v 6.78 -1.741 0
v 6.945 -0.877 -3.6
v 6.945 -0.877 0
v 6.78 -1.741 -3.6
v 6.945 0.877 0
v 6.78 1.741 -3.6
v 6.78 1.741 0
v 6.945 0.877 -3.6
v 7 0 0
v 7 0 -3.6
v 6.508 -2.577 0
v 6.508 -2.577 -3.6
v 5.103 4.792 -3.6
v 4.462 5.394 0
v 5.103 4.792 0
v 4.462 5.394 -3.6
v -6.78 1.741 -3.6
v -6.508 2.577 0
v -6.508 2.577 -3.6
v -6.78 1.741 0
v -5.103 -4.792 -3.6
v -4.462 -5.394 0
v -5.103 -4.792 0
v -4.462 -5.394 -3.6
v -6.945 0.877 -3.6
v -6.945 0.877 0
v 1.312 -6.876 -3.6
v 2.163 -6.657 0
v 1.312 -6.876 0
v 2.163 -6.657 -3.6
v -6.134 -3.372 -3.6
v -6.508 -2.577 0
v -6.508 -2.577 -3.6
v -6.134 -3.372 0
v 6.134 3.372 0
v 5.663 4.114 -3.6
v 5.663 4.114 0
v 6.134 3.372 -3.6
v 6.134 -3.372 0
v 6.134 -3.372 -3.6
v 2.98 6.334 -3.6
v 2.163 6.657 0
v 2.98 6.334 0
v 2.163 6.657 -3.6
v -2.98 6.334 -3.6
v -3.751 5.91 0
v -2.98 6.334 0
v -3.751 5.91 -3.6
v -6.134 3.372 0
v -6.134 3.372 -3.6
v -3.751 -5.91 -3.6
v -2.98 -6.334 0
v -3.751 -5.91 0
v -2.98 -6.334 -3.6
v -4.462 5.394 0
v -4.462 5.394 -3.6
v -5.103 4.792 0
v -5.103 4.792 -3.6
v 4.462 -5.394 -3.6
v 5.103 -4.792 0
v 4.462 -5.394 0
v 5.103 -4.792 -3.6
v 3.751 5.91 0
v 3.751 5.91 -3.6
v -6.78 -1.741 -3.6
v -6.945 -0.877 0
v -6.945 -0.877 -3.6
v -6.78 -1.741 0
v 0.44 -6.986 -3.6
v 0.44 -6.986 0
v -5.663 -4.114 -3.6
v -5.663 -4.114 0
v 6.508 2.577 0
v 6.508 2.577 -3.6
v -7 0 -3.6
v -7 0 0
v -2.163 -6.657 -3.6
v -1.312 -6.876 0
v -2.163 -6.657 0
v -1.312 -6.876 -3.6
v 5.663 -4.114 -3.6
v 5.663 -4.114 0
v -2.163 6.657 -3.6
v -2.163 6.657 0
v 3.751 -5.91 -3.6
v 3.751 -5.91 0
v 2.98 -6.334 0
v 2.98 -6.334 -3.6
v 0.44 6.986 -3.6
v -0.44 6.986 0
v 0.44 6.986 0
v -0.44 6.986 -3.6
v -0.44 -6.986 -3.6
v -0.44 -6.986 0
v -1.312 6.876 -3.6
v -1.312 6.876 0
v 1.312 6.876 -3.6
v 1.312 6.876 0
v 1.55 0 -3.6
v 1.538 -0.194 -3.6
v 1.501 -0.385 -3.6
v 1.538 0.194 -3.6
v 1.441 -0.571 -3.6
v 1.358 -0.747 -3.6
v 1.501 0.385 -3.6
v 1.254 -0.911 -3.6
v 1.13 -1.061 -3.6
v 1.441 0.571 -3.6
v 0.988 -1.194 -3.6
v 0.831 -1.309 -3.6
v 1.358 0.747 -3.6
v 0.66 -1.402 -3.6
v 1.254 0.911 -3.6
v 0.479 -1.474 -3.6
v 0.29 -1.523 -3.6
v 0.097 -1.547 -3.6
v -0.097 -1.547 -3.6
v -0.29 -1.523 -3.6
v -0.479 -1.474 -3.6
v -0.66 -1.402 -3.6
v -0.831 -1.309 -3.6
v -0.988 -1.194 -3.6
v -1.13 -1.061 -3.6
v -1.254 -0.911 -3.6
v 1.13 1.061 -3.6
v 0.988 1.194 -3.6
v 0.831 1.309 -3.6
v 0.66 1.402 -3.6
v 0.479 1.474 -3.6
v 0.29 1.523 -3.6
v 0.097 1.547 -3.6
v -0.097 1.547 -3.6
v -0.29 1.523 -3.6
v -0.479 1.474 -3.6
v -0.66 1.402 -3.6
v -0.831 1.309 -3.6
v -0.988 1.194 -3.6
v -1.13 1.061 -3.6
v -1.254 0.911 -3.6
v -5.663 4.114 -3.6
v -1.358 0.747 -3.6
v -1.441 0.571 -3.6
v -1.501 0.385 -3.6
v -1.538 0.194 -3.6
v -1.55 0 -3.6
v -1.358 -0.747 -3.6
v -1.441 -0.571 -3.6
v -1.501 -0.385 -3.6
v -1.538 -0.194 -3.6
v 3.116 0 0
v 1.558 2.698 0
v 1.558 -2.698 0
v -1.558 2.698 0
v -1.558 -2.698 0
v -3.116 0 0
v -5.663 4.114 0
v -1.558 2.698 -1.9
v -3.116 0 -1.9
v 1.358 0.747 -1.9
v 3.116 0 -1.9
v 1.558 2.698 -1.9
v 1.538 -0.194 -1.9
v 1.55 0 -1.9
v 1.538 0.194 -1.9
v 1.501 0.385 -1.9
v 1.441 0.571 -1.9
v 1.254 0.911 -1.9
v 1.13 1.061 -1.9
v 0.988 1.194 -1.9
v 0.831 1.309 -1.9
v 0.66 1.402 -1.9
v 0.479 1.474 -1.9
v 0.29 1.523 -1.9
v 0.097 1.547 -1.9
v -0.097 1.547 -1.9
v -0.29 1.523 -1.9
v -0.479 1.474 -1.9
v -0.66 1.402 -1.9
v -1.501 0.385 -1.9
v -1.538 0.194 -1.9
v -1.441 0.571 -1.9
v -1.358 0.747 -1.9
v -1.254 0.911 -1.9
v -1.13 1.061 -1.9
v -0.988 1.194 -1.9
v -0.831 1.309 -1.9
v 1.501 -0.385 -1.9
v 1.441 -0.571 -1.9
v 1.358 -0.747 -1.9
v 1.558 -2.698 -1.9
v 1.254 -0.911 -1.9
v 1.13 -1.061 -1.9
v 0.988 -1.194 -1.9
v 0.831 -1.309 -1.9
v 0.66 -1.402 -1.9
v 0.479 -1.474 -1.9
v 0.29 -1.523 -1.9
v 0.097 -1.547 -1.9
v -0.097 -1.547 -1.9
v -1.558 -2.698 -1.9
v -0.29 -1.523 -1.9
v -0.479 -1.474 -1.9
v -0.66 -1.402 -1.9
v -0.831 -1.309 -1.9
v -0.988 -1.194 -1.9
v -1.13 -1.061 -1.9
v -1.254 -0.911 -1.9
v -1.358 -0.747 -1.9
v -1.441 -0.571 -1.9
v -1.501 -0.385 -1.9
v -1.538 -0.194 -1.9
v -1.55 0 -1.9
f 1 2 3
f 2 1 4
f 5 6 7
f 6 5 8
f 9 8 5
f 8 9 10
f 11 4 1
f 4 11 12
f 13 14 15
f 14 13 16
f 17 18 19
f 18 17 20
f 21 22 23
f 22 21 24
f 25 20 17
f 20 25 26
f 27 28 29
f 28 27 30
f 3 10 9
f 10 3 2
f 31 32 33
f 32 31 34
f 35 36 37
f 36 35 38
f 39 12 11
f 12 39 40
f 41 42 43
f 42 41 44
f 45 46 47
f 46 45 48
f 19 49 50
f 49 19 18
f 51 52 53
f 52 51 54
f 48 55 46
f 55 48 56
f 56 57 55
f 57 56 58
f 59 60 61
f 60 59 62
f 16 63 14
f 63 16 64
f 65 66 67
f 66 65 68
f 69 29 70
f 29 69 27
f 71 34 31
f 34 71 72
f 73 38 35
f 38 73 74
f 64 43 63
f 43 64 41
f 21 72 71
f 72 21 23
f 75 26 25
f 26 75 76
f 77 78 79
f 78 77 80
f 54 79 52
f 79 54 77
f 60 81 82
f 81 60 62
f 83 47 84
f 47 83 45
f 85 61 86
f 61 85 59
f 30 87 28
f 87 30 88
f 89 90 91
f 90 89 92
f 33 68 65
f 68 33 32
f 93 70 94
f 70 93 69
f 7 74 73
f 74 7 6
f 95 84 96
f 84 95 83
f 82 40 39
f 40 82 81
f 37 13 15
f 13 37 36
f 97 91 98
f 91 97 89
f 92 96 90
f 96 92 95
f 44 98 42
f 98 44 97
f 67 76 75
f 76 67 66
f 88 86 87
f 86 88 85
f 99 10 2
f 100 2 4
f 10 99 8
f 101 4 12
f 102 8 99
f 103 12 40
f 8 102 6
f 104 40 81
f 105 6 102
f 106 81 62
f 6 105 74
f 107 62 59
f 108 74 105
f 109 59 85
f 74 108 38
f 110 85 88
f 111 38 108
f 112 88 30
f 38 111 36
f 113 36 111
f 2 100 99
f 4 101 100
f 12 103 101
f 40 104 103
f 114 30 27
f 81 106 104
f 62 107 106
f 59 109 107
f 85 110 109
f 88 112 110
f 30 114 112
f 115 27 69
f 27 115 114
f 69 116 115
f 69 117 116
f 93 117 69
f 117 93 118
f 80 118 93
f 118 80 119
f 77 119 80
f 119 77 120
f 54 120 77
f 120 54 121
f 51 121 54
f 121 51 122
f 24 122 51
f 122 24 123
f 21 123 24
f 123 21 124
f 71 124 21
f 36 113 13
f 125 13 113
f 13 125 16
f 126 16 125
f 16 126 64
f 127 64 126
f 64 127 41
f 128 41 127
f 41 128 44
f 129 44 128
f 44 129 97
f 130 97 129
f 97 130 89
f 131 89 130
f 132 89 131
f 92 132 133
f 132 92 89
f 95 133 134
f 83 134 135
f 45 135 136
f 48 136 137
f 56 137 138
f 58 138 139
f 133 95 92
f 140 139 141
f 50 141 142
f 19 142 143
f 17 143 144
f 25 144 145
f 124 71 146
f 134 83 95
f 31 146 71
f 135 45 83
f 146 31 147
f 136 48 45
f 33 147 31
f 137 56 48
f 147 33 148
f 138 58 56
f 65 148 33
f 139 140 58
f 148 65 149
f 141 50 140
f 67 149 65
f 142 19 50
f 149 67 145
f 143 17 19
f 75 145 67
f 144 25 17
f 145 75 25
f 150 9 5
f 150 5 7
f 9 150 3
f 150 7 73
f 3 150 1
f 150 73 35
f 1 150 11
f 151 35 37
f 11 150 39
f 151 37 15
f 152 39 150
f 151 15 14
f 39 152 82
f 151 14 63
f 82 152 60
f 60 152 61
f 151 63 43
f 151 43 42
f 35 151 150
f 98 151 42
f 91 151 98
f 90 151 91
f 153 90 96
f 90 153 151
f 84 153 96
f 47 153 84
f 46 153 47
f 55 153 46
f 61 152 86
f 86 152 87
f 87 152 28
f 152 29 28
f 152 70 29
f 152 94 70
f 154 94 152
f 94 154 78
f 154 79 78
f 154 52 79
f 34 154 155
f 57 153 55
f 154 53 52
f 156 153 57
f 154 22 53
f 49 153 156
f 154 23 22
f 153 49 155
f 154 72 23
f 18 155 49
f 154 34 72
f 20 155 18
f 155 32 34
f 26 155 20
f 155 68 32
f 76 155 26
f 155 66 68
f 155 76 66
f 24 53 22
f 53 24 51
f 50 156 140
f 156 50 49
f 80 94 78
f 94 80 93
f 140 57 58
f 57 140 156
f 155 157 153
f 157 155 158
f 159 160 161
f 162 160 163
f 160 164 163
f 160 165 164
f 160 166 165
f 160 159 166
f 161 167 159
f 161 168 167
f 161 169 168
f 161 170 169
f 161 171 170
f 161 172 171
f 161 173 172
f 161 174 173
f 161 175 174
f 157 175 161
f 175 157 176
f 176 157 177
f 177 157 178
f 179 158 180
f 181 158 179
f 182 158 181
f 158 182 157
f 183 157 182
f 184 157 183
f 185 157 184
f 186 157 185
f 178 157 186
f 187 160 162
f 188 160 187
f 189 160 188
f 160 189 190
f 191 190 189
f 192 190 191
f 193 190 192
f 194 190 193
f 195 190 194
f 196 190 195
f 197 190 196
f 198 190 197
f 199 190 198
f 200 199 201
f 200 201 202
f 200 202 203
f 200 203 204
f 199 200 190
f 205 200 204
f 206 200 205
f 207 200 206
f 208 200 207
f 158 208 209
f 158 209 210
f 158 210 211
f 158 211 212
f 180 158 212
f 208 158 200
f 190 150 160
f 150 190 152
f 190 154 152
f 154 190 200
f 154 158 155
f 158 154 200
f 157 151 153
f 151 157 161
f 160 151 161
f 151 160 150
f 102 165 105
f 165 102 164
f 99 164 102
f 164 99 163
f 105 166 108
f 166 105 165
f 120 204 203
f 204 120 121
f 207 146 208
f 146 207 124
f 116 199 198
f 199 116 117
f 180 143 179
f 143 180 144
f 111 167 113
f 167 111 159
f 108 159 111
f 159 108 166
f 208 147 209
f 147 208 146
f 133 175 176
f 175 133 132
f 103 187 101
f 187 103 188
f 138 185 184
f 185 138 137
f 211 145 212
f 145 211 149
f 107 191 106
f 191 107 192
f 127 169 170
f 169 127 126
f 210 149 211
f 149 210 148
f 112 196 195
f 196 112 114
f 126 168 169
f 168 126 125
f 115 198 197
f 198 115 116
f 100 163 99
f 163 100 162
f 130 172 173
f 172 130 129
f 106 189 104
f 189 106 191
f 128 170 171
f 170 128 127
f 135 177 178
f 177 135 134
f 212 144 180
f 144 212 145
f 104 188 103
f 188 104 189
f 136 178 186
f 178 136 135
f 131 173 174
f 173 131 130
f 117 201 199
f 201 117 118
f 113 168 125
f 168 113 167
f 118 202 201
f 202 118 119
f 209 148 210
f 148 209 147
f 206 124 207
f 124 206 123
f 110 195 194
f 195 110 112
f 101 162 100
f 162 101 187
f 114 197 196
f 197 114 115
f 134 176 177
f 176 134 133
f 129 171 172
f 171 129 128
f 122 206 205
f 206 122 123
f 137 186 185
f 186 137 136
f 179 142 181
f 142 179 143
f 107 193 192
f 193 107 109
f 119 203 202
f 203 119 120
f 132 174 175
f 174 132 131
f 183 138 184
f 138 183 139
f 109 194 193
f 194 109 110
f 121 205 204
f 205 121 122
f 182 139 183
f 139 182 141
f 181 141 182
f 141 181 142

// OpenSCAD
$fn = 50;


difference() {
	union() {
		translate(v = [0, 0, -3.6000000000]) {
			cylinder(h = 3.6000000000, r = 7.0000000000);
		}
		translate(v = [0, 0, -2.1000000000]) {
			cylinder(h = 2.1000000000, r = 2.8750000000);
		}
	}
	union() {
		translate(v = [0, 0, 0]) {
			rotate(a = [0, 0, 0]) {
				difference() {
					union() {
						translate(v = [0, 0, -1.9000000000]) {
							linear_extrude(height = 1.9000000000) {
								polygon(points = [[3.1158000000, 0.0000000000], [1.5579000000, 2.6983619531], [-1.5579000000, 2.6983619531], [-3.1158000000, 0.0000000000], [-1.5579000000, -2.6983619531], [1.5579000000, -2.6983619531]]);
							}
						}
					}
					union();
				}
			}
		}
		#translate(v = [0, 0, -100.0000000000]) {
			cylinder(h = 200, r = 1.5500000000);
		}
	}
}
